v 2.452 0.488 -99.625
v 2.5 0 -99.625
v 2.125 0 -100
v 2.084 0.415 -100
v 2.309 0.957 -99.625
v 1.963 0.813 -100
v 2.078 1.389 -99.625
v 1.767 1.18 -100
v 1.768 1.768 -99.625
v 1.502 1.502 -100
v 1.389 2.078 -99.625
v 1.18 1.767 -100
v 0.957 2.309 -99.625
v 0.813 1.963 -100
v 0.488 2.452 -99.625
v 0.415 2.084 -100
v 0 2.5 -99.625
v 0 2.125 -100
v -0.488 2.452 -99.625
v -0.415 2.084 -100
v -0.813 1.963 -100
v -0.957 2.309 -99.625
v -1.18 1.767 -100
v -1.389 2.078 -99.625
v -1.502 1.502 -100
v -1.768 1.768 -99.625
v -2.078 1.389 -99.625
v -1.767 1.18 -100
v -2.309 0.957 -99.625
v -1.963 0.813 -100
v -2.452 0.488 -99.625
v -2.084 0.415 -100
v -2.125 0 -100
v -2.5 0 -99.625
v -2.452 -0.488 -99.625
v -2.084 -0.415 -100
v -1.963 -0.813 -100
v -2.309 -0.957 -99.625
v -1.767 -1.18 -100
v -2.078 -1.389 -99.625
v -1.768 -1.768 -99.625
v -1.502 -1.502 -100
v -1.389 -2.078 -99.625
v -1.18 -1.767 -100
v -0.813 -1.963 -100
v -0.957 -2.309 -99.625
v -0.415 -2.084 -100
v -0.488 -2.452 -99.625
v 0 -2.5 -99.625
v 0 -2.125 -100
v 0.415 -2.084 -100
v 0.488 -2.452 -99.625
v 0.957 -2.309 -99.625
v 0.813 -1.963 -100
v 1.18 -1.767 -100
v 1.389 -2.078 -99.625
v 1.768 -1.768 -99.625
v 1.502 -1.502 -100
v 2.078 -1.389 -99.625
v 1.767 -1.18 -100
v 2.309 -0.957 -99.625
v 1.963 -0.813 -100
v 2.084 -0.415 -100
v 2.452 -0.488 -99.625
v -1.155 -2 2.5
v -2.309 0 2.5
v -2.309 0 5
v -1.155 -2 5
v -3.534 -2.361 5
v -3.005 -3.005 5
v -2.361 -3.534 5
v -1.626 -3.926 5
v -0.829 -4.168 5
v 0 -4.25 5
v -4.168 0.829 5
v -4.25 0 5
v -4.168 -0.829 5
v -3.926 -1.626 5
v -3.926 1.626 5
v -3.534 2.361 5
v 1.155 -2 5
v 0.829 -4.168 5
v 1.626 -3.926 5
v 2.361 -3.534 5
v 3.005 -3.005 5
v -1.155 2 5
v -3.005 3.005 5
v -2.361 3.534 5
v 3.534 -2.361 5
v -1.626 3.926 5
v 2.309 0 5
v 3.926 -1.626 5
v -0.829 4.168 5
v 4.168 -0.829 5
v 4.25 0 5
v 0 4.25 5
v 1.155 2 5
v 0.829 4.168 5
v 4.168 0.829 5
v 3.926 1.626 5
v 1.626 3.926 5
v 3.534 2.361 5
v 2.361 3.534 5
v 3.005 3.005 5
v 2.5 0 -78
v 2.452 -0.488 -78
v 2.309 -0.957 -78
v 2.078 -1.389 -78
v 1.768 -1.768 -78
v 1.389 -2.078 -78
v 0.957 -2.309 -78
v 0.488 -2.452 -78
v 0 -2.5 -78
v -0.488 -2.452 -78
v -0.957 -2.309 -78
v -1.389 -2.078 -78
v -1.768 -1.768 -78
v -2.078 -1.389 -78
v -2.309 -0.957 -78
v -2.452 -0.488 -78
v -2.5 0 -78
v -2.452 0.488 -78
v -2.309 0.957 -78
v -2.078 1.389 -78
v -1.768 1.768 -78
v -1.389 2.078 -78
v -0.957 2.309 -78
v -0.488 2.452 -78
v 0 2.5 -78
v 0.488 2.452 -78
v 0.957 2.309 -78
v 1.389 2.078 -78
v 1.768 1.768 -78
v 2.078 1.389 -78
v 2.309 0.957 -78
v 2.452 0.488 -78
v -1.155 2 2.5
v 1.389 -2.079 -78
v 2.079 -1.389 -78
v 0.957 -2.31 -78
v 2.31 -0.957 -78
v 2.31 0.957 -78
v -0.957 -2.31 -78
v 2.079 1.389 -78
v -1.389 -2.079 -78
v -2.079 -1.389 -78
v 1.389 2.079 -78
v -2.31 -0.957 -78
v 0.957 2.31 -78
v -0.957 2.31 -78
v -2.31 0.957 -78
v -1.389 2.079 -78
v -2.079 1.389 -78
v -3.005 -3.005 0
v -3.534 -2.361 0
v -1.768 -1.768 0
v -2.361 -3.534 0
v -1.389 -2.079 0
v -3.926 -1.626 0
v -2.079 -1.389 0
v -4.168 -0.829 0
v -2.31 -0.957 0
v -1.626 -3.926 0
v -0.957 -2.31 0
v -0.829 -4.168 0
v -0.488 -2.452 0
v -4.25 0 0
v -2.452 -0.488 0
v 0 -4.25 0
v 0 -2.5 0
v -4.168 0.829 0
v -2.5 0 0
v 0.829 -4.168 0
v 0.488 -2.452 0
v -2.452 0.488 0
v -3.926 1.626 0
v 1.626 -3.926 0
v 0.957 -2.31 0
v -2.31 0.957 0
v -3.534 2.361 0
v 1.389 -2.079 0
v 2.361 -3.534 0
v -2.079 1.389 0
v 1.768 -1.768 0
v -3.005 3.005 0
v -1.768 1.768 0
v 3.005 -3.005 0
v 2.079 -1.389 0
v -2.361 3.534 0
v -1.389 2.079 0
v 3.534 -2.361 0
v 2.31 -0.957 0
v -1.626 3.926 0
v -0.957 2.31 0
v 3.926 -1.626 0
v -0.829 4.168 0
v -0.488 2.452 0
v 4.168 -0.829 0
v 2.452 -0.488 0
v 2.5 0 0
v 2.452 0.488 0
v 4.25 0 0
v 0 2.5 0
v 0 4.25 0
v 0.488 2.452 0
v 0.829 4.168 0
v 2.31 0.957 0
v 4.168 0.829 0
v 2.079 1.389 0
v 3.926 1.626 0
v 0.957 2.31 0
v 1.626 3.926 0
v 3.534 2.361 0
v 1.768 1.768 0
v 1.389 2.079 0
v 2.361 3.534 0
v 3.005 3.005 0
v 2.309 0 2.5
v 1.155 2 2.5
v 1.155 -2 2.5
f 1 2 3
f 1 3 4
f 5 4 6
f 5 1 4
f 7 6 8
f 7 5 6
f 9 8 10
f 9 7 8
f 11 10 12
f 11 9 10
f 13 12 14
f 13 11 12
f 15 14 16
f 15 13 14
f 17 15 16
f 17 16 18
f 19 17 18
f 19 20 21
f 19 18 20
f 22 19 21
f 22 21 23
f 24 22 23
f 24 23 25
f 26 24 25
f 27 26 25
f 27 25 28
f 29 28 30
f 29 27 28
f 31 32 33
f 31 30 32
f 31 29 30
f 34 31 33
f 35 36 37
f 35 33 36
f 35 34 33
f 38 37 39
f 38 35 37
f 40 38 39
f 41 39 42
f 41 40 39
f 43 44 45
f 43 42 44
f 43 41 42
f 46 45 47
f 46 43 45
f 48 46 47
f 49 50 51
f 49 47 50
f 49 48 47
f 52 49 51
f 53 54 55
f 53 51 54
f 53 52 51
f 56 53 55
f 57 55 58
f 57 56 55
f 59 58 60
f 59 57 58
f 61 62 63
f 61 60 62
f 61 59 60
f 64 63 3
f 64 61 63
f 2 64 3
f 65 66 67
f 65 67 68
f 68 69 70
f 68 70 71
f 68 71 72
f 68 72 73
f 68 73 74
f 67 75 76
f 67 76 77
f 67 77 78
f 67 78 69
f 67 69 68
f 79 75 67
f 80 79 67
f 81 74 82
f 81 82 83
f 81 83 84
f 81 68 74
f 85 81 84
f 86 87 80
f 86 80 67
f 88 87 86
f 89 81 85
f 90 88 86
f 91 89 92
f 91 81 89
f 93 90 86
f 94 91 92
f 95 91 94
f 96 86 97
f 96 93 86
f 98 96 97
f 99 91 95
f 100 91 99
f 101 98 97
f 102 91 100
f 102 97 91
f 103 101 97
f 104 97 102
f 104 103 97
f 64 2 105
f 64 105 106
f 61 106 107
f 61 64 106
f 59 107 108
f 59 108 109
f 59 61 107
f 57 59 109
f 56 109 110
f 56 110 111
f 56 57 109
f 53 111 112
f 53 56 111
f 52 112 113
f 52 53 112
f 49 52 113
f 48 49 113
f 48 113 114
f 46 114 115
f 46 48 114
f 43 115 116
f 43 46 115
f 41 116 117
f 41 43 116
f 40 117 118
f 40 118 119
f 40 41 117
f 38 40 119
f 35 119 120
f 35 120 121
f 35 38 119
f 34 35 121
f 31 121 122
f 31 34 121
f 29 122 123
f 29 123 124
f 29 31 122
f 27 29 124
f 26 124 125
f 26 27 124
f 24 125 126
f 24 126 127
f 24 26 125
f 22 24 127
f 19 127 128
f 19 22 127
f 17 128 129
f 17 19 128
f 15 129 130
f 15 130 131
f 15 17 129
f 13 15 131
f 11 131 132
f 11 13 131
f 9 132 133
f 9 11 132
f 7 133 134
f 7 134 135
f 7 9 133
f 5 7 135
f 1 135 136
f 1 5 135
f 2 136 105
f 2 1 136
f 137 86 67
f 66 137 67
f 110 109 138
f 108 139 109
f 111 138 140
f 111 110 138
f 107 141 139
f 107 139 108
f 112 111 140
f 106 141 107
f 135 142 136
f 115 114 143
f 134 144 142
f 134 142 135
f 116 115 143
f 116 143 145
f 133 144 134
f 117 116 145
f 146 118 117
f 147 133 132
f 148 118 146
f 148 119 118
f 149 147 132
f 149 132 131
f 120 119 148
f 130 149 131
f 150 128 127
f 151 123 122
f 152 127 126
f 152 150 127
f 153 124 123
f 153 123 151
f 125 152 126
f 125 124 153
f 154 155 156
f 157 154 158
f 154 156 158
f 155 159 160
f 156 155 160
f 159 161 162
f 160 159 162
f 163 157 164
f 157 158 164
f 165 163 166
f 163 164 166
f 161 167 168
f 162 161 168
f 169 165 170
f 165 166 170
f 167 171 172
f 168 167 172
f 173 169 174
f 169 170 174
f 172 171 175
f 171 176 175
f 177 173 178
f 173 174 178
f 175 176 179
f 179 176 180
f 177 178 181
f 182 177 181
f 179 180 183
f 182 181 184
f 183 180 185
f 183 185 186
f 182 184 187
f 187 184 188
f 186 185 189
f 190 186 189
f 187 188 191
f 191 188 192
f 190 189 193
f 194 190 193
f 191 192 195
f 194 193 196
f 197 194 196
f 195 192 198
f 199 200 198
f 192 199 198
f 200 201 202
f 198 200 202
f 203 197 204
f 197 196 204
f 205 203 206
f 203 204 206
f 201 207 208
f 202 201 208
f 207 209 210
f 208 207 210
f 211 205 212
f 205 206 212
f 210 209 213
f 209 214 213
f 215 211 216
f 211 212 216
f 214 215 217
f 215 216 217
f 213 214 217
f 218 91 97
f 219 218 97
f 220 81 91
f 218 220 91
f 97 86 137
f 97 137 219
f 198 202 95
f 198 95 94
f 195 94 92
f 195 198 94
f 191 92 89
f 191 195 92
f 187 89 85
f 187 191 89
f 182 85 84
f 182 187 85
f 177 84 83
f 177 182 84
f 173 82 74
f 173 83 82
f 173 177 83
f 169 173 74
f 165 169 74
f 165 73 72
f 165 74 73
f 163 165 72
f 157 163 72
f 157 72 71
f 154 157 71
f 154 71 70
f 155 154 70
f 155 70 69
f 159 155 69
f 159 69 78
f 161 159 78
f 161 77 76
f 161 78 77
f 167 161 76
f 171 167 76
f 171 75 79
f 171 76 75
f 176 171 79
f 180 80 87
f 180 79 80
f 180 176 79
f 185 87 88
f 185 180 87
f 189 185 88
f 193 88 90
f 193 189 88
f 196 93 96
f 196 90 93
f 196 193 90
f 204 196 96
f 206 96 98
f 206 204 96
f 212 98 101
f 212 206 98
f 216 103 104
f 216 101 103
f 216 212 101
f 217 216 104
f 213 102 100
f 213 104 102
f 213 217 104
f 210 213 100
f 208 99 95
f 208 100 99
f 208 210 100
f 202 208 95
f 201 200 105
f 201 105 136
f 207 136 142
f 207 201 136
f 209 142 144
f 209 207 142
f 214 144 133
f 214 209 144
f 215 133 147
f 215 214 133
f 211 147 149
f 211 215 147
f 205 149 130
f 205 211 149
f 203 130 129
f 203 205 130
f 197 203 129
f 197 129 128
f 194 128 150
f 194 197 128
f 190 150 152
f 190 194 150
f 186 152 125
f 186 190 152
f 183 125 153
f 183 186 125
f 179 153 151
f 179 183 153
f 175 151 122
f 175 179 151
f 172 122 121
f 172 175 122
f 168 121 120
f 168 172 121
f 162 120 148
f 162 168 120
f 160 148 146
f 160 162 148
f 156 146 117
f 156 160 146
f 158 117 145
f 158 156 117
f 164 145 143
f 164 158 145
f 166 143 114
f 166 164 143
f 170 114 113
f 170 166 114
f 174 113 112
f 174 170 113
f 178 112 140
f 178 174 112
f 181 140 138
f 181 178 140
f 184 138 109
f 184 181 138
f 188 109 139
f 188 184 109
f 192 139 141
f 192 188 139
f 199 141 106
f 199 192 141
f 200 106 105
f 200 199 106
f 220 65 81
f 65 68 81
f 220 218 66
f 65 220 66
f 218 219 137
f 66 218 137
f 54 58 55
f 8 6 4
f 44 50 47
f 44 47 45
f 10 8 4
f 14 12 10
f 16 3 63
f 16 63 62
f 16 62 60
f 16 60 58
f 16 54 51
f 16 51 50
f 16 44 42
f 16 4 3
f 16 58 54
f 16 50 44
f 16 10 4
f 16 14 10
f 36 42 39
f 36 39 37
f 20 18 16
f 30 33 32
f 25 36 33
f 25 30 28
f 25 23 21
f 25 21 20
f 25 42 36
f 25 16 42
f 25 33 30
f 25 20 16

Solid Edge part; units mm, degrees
sketch "Sketch1" plane through (0, 0, 0) normal (0, 0, 1) x (1, 0, 0)
  circle A0 centre (0, 0) radius 4.25
  dimension "D1" = 8.5
extrude "Protrusion1" add sketch "Sketch1" along normal blind 5
sketch "Sketch2" plane through (0, 0, 0) normal (0, 0, -1) x (1, 0, 0)
  circle A0 centre (0, 0) radius 2.5
extrude "Protrusion2" add sketch "Sketch2" along normal blind 100
sketch "Sketch3" plane through (0, 0, -100) normal (0, 0, -1) x (1, 0, 0)
  circle A0 centre (0, 0) radius 2.4997
extrude "Cutout1" cut sketch "Sketch3" against normal blind 22 flip side to cut
chamfer "Chamfer_1" distance 0.375 angle 45 1 edges at (-2.4997, 0, -100)
sketch "Sketch4" plane through (0, 0, 5) normal (0, 0, 1) x (1, 0, 0)
  line L0 (-1.1547, 2) -> (1.1547, 2)
  line L1 (2.3094, 0) -> (1.1547, 2)
  line L2 (1.1547, -2) -> (2.3094, 0)
  line L3 (-1.1547, -2) -> (1.1547, -2)
  line L4 (-2.3094, 0) -> (-1.1547, -2)
  line L5 (-1.1547, 2) -> (-2.3094, 0)
  dimension "D1" = 4
extrude "Cutout2" cut sketch "Sketch4" against normal blind 2.5
properties part number "170766" material "Stainless Steel, 304"
